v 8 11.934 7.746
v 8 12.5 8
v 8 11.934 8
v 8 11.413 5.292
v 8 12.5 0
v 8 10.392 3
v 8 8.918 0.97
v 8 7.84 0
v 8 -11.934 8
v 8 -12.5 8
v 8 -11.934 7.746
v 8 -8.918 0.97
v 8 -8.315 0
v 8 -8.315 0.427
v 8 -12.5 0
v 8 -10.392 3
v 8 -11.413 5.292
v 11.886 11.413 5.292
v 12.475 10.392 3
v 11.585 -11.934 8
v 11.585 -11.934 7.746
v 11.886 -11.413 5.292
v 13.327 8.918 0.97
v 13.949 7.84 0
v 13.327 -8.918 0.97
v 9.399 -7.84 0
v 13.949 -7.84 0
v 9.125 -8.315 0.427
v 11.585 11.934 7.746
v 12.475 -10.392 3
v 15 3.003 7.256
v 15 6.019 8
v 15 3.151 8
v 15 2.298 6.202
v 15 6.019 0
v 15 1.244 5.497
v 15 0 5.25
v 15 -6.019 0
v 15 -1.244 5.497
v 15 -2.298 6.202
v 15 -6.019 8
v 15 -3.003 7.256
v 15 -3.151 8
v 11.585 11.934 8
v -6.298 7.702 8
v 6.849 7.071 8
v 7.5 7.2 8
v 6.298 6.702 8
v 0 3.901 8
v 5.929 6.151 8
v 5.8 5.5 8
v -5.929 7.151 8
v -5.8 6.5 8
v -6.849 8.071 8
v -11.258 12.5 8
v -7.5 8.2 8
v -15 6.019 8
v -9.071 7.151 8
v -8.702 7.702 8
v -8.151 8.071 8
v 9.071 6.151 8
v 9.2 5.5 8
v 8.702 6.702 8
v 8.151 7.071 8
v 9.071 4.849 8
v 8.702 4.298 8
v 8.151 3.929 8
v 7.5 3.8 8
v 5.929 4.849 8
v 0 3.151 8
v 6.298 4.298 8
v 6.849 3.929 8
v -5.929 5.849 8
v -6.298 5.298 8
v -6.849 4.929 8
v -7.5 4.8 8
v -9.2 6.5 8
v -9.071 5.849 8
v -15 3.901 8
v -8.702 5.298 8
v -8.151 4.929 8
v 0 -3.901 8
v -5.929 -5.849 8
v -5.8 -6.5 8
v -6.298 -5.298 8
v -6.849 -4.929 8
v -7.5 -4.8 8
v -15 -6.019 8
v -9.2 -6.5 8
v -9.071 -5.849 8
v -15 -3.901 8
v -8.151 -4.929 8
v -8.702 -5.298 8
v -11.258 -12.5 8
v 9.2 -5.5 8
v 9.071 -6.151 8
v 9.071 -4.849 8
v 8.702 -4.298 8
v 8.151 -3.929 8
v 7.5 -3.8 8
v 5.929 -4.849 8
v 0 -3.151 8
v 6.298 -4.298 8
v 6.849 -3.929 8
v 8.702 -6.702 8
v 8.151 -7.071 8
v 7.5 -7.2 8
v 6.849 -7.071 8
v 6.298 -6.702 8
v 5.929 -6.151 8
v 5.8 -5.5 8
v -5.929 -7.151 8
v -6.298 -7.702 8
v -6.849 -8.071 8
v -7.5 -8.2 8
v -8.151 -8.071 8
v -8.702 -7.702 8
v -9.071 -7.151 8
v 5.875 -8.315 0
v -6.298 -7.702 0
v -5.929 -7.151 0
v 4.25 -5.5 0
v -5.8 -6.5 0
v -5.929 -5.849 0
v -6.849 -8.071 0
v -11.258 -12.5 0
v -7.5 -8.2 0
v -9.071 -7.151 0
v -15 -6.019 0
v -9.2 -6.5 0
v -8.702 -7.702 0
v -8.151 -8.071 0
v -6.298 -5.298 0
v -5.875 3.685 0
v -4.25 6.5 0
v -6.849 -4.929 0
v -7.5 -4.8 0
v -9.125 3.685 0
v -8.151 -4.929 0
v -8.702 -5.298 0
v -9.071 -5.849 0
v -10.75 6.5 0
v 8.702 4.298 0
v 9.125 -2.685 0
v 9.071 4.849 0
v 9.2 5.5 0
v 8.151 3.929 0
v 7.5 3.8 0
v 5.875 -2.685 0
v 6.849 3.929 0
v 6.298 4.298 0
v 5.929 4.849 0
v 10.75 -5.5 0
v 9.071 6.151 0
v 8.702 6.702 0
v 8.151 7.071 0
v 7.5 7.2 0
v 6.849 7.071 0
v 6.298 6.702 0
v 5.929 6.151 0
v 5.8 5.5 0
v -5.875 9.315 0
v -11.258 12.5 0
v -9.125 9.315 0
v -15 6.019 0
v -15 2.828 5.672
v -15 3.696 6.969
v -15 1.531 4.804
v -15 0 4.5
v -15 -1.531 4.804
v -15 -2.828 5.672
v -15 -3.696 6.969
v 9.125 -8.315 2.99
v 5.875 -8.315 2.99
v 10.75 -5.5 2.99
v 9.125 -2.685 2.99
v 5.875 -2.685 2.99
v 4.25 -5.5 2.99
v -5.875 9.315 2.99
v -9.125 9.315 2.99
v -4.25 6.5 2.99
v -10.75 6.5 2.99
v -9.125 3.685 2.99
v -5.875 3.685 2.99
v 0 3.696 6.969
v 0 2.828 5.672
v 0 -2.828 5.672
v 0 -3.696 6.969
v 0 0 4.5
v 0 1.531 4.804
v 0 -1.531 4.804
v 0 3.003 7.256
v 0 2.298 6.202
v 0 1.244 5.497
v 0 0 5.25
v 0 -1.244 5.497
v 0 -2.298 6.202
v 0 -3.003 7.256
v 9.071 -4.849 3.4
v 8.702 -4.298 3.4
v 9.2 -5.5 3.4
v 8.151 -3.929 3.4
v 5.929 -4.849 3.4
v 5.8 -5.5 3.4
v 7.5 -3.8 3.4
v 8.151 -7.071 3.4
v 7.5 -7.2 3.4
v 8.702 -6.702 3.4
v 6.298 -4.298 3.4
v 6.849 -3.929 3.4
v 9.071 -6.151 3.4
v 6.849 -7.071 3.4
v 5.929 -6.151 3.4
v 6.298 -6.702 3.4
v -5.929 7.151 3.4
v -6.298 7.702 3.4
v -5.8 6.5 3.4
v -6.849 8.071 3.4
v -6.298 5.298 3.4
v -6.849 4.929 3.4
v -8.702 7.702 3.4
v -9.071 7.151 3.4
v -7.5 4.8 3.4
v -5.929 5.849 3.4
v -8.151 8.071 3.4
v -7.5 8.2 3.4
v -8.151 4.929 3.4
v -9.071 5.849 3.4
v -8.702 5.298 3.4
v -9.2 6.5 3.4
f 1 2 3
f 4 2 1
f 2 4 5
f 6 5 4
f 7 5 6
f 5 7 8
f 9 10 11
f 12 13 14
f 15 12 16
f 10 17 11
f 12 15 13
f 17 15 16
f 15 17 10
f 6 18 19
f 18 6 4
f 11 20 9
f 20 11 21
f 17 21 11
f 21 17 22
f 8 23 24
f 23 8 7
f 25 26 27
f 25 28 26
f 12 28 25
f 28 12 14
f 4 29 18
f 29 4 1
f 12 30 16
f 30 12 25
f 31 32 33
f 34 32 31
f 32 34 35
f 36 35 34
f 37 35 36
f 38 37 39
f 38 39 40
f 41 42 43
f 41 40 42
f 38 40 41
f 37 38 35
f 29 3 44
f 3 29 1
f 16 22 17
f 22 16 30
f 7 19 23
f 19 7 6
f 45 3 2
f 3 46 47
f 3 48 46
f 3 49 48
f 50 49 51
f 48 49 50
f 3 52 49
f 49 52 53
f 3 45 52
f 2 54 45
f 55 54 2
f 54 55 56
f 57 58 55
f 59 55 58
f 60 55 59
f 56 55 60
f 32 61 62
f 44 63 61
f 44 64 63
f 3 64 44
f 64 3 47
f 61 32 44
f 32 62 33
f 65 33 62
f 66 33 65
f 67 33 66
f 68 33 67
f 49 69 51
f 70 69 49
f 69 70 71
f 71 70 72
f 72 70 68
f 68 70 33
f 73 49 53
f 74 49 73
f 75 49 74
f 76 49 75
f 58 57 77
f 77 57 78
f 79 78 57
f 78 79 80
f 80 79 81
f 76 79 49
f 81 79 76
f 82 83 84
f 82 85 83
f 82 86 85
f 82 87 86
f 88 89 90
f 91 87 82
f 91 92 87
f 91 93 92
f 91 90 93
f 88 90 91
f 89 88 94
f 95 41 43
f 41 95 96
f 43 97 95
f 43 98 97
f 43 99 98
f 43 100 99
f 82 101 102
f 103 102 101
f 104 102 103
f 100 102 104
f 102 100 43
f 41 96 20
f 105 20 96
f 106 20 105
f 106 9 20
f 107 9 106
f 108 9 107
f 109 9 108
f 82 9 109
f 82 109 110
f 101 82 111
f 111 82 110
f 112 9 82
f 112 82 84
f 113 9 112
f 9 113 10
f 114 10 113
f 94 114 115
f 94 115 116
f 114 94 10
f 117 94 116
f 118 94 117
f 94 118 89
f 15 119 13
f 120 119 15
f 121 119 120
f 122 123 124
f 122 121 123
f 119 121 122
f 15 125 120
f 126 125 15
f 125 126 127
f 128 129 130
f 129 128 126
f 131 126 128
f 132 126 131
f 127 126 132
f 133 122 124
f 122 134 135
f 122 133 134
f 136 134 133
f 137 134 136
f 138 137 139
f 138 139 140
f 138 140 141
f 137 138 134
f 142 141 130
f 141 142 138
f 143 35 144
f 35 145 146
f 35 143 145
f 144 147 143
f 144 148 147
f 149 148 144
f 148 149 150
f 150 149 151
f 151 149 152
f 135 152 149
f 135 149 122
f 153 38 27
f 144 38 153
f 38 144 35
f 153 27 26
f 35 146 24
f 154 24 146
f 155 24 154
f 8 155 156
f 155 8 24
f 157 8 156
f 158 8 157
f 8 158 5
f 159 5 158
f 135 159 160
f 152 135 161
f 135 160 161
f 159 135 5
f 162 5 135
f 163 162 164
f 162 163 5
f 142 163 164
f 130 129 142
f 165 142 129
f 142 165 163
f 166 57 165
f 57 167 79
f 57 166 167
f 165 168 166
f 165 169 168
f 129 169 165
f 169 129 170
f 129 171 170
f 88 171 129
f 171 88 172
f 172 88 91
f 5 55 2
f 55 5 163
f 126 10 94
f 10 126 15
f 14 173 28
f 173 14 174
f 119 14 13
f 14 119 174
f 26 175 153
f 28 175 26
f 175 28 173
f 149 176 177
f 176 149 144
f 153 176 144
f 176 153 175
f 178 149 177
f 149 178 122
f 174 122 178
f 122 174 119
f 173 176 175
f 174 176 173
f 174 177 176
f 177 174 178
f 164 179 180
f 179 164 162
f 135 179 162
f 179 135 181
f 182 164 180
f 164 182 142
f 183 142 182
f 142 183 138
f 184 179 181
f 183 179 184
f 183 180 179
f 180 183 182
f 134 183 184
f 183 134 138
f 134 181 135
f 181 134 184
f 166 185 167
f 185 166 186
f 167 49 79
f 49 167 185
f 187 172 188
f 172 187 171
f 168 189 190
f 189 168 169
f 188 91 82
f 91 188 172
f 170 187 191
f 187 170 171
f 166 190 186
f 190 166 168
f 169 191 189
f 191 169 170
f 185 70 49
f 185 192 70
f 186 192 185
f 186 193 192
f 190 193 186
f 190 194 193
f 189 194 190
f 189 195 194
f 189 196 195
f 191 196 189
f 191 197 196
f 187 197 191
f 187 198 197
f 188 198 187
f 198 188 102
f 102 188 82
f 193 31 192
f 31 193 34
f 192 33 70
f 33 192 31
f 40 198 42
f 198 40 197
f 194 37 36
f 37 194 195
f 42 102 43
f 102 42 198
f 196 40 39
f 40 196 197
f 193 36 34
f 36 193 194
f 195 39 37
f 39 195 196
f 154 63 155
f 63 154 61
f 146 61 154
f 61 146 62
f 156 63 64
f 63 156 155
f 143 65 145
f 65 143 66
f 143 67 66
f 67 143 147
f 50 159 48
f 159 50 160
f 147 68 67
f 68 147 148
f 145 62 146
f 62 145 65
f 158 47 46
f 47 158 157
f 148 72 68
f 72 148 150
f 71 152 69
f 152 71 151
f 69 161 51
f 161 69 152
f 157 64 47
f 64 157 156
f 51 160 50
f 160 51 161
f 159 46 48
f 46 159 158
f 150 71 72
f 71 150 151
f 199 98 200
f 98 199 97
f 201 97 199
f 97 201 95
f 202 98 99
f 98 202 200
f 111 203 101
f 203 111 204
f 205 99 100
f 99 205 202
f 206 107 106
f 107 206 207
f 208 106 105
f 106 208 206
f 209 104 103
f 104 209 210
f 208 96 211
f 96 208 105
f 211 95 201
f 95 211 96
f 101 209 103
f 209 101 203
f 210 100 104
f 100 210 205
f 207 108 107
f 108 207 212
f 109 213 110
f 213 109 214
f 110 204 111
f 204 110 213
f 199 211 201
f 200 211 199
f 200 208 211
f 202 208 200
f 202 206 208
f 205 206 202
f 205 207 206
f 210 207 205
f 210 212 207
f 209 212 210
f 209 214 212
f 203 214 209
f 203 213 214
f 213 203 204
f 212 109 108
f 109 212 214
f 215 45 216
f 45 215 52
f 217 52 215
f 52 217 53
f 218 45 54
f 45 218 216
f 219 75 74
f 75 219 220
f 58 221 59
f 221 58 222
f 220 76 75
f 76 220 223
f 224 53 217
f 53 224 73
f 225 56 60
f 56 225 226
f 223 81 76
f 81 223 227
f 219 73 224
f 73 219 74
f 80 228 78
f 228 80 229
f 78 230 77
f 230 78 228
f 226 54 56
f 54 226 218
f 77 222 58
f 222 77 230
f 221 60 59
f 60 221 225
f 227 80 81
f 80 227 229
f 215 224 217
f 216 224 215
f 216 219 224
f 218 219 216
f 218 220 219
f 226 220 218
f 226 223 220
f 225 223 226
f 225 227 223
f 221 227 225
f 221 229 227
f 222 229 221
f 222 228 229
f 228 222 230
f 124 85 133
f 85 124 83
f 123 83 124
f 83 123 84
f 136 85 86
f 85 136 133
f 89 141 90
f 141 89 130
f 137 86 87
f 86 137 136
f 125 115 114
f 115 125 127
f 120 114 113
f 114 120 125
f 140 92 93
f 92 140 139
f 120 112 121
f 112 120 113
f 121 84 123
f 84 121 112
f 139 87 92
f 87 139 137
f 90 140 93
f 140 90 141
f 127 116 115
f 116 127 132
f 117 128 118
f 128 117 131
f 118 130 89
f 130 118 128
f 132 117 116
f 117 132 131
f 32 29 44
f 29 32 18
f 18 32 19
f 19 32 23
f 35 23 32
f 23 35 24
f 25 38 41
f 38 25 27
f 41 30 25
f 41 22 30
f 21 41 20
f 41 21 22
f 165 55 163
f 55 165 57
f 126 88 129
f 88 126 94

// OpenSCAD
holeX = 7.5;
holeY = 6.5;

holeR = 3.4 / 2;
nutR = 3.25;
nutH = 3;
corner_cut = 26;

studding_dia = 8.0;
shaft_dia = 6.5;

module coupling()
{

	translate([0,0,4])
	union()
	{
		difference()
		{
			cube(size = [30,25,8], center = true);
	
			*cube(size = [2,40,30], center = true);
                
			//nut holes
#			translate([ holeX, -holeY+1,- 4.01]) cylinder(h = nutH, r=nutR, $fn=6);
			translate([-holeX,  holeY,- 4.01]) cylinder(h = nutH, r=nutR, $fn=6);
			
			//shaft groves
			translate([ -16, 0, 4.5]) rotate([0,90,0]) cylinder(h = 16, r=studding_dia / 2, $fn=16);
			translate([-0.5, 0, 4.5]) rotate([0,90,0]) cylinder(h = 16, r=shaft_dia / 2,    $fn=16);
			
			//screw holes
			translate([ holeX,  holeY-1, -10]) cylinder(h = 20, r=holeR, $fn=16);
			translate([ holeX, -holeY++1, -4+nutH+0.4]) cylinder(h = 20, r=holeR, $fn=16);
			translate([-holeX,  holeY, -4+nutH+0.4]) cylinder(h = 20, r=holeR, $fn=16);
			translate([-holeX, -holeY, -10]) cylinder(h = 20, r=holeR, $fn=16);
			
			//corners
			rotate([0,0,30])   translate([corner_cut, 0, 0]) cube(size = [20,40,20], center = true);
			rotate([0,0,-30])  translate([corner_cut, 0, 0]) cube(size = [20,40,20], center = true);
			rotate([0,0,150])  translate([corner_cut, 0, 0]) cube(size = [20,40,20], center = true);
			rotate([0,0,-150]) translate([corner_cut, 0, 0]) cube(size = [20,40,20], center = true);


			
			translate([15-7,0,5])
			difference()
			{
			translate([5,0,0])
			cube([10,30,20],true);
			translate([-1,0,0])
			rotate([0,90,0])
			cylinder(r=24/2,h=8);
			}
		}
	}
}

coupling();
//for(i=[0:1])for(j=[0:1])translate([i*34, j*30, 0])coupling(c=1);
